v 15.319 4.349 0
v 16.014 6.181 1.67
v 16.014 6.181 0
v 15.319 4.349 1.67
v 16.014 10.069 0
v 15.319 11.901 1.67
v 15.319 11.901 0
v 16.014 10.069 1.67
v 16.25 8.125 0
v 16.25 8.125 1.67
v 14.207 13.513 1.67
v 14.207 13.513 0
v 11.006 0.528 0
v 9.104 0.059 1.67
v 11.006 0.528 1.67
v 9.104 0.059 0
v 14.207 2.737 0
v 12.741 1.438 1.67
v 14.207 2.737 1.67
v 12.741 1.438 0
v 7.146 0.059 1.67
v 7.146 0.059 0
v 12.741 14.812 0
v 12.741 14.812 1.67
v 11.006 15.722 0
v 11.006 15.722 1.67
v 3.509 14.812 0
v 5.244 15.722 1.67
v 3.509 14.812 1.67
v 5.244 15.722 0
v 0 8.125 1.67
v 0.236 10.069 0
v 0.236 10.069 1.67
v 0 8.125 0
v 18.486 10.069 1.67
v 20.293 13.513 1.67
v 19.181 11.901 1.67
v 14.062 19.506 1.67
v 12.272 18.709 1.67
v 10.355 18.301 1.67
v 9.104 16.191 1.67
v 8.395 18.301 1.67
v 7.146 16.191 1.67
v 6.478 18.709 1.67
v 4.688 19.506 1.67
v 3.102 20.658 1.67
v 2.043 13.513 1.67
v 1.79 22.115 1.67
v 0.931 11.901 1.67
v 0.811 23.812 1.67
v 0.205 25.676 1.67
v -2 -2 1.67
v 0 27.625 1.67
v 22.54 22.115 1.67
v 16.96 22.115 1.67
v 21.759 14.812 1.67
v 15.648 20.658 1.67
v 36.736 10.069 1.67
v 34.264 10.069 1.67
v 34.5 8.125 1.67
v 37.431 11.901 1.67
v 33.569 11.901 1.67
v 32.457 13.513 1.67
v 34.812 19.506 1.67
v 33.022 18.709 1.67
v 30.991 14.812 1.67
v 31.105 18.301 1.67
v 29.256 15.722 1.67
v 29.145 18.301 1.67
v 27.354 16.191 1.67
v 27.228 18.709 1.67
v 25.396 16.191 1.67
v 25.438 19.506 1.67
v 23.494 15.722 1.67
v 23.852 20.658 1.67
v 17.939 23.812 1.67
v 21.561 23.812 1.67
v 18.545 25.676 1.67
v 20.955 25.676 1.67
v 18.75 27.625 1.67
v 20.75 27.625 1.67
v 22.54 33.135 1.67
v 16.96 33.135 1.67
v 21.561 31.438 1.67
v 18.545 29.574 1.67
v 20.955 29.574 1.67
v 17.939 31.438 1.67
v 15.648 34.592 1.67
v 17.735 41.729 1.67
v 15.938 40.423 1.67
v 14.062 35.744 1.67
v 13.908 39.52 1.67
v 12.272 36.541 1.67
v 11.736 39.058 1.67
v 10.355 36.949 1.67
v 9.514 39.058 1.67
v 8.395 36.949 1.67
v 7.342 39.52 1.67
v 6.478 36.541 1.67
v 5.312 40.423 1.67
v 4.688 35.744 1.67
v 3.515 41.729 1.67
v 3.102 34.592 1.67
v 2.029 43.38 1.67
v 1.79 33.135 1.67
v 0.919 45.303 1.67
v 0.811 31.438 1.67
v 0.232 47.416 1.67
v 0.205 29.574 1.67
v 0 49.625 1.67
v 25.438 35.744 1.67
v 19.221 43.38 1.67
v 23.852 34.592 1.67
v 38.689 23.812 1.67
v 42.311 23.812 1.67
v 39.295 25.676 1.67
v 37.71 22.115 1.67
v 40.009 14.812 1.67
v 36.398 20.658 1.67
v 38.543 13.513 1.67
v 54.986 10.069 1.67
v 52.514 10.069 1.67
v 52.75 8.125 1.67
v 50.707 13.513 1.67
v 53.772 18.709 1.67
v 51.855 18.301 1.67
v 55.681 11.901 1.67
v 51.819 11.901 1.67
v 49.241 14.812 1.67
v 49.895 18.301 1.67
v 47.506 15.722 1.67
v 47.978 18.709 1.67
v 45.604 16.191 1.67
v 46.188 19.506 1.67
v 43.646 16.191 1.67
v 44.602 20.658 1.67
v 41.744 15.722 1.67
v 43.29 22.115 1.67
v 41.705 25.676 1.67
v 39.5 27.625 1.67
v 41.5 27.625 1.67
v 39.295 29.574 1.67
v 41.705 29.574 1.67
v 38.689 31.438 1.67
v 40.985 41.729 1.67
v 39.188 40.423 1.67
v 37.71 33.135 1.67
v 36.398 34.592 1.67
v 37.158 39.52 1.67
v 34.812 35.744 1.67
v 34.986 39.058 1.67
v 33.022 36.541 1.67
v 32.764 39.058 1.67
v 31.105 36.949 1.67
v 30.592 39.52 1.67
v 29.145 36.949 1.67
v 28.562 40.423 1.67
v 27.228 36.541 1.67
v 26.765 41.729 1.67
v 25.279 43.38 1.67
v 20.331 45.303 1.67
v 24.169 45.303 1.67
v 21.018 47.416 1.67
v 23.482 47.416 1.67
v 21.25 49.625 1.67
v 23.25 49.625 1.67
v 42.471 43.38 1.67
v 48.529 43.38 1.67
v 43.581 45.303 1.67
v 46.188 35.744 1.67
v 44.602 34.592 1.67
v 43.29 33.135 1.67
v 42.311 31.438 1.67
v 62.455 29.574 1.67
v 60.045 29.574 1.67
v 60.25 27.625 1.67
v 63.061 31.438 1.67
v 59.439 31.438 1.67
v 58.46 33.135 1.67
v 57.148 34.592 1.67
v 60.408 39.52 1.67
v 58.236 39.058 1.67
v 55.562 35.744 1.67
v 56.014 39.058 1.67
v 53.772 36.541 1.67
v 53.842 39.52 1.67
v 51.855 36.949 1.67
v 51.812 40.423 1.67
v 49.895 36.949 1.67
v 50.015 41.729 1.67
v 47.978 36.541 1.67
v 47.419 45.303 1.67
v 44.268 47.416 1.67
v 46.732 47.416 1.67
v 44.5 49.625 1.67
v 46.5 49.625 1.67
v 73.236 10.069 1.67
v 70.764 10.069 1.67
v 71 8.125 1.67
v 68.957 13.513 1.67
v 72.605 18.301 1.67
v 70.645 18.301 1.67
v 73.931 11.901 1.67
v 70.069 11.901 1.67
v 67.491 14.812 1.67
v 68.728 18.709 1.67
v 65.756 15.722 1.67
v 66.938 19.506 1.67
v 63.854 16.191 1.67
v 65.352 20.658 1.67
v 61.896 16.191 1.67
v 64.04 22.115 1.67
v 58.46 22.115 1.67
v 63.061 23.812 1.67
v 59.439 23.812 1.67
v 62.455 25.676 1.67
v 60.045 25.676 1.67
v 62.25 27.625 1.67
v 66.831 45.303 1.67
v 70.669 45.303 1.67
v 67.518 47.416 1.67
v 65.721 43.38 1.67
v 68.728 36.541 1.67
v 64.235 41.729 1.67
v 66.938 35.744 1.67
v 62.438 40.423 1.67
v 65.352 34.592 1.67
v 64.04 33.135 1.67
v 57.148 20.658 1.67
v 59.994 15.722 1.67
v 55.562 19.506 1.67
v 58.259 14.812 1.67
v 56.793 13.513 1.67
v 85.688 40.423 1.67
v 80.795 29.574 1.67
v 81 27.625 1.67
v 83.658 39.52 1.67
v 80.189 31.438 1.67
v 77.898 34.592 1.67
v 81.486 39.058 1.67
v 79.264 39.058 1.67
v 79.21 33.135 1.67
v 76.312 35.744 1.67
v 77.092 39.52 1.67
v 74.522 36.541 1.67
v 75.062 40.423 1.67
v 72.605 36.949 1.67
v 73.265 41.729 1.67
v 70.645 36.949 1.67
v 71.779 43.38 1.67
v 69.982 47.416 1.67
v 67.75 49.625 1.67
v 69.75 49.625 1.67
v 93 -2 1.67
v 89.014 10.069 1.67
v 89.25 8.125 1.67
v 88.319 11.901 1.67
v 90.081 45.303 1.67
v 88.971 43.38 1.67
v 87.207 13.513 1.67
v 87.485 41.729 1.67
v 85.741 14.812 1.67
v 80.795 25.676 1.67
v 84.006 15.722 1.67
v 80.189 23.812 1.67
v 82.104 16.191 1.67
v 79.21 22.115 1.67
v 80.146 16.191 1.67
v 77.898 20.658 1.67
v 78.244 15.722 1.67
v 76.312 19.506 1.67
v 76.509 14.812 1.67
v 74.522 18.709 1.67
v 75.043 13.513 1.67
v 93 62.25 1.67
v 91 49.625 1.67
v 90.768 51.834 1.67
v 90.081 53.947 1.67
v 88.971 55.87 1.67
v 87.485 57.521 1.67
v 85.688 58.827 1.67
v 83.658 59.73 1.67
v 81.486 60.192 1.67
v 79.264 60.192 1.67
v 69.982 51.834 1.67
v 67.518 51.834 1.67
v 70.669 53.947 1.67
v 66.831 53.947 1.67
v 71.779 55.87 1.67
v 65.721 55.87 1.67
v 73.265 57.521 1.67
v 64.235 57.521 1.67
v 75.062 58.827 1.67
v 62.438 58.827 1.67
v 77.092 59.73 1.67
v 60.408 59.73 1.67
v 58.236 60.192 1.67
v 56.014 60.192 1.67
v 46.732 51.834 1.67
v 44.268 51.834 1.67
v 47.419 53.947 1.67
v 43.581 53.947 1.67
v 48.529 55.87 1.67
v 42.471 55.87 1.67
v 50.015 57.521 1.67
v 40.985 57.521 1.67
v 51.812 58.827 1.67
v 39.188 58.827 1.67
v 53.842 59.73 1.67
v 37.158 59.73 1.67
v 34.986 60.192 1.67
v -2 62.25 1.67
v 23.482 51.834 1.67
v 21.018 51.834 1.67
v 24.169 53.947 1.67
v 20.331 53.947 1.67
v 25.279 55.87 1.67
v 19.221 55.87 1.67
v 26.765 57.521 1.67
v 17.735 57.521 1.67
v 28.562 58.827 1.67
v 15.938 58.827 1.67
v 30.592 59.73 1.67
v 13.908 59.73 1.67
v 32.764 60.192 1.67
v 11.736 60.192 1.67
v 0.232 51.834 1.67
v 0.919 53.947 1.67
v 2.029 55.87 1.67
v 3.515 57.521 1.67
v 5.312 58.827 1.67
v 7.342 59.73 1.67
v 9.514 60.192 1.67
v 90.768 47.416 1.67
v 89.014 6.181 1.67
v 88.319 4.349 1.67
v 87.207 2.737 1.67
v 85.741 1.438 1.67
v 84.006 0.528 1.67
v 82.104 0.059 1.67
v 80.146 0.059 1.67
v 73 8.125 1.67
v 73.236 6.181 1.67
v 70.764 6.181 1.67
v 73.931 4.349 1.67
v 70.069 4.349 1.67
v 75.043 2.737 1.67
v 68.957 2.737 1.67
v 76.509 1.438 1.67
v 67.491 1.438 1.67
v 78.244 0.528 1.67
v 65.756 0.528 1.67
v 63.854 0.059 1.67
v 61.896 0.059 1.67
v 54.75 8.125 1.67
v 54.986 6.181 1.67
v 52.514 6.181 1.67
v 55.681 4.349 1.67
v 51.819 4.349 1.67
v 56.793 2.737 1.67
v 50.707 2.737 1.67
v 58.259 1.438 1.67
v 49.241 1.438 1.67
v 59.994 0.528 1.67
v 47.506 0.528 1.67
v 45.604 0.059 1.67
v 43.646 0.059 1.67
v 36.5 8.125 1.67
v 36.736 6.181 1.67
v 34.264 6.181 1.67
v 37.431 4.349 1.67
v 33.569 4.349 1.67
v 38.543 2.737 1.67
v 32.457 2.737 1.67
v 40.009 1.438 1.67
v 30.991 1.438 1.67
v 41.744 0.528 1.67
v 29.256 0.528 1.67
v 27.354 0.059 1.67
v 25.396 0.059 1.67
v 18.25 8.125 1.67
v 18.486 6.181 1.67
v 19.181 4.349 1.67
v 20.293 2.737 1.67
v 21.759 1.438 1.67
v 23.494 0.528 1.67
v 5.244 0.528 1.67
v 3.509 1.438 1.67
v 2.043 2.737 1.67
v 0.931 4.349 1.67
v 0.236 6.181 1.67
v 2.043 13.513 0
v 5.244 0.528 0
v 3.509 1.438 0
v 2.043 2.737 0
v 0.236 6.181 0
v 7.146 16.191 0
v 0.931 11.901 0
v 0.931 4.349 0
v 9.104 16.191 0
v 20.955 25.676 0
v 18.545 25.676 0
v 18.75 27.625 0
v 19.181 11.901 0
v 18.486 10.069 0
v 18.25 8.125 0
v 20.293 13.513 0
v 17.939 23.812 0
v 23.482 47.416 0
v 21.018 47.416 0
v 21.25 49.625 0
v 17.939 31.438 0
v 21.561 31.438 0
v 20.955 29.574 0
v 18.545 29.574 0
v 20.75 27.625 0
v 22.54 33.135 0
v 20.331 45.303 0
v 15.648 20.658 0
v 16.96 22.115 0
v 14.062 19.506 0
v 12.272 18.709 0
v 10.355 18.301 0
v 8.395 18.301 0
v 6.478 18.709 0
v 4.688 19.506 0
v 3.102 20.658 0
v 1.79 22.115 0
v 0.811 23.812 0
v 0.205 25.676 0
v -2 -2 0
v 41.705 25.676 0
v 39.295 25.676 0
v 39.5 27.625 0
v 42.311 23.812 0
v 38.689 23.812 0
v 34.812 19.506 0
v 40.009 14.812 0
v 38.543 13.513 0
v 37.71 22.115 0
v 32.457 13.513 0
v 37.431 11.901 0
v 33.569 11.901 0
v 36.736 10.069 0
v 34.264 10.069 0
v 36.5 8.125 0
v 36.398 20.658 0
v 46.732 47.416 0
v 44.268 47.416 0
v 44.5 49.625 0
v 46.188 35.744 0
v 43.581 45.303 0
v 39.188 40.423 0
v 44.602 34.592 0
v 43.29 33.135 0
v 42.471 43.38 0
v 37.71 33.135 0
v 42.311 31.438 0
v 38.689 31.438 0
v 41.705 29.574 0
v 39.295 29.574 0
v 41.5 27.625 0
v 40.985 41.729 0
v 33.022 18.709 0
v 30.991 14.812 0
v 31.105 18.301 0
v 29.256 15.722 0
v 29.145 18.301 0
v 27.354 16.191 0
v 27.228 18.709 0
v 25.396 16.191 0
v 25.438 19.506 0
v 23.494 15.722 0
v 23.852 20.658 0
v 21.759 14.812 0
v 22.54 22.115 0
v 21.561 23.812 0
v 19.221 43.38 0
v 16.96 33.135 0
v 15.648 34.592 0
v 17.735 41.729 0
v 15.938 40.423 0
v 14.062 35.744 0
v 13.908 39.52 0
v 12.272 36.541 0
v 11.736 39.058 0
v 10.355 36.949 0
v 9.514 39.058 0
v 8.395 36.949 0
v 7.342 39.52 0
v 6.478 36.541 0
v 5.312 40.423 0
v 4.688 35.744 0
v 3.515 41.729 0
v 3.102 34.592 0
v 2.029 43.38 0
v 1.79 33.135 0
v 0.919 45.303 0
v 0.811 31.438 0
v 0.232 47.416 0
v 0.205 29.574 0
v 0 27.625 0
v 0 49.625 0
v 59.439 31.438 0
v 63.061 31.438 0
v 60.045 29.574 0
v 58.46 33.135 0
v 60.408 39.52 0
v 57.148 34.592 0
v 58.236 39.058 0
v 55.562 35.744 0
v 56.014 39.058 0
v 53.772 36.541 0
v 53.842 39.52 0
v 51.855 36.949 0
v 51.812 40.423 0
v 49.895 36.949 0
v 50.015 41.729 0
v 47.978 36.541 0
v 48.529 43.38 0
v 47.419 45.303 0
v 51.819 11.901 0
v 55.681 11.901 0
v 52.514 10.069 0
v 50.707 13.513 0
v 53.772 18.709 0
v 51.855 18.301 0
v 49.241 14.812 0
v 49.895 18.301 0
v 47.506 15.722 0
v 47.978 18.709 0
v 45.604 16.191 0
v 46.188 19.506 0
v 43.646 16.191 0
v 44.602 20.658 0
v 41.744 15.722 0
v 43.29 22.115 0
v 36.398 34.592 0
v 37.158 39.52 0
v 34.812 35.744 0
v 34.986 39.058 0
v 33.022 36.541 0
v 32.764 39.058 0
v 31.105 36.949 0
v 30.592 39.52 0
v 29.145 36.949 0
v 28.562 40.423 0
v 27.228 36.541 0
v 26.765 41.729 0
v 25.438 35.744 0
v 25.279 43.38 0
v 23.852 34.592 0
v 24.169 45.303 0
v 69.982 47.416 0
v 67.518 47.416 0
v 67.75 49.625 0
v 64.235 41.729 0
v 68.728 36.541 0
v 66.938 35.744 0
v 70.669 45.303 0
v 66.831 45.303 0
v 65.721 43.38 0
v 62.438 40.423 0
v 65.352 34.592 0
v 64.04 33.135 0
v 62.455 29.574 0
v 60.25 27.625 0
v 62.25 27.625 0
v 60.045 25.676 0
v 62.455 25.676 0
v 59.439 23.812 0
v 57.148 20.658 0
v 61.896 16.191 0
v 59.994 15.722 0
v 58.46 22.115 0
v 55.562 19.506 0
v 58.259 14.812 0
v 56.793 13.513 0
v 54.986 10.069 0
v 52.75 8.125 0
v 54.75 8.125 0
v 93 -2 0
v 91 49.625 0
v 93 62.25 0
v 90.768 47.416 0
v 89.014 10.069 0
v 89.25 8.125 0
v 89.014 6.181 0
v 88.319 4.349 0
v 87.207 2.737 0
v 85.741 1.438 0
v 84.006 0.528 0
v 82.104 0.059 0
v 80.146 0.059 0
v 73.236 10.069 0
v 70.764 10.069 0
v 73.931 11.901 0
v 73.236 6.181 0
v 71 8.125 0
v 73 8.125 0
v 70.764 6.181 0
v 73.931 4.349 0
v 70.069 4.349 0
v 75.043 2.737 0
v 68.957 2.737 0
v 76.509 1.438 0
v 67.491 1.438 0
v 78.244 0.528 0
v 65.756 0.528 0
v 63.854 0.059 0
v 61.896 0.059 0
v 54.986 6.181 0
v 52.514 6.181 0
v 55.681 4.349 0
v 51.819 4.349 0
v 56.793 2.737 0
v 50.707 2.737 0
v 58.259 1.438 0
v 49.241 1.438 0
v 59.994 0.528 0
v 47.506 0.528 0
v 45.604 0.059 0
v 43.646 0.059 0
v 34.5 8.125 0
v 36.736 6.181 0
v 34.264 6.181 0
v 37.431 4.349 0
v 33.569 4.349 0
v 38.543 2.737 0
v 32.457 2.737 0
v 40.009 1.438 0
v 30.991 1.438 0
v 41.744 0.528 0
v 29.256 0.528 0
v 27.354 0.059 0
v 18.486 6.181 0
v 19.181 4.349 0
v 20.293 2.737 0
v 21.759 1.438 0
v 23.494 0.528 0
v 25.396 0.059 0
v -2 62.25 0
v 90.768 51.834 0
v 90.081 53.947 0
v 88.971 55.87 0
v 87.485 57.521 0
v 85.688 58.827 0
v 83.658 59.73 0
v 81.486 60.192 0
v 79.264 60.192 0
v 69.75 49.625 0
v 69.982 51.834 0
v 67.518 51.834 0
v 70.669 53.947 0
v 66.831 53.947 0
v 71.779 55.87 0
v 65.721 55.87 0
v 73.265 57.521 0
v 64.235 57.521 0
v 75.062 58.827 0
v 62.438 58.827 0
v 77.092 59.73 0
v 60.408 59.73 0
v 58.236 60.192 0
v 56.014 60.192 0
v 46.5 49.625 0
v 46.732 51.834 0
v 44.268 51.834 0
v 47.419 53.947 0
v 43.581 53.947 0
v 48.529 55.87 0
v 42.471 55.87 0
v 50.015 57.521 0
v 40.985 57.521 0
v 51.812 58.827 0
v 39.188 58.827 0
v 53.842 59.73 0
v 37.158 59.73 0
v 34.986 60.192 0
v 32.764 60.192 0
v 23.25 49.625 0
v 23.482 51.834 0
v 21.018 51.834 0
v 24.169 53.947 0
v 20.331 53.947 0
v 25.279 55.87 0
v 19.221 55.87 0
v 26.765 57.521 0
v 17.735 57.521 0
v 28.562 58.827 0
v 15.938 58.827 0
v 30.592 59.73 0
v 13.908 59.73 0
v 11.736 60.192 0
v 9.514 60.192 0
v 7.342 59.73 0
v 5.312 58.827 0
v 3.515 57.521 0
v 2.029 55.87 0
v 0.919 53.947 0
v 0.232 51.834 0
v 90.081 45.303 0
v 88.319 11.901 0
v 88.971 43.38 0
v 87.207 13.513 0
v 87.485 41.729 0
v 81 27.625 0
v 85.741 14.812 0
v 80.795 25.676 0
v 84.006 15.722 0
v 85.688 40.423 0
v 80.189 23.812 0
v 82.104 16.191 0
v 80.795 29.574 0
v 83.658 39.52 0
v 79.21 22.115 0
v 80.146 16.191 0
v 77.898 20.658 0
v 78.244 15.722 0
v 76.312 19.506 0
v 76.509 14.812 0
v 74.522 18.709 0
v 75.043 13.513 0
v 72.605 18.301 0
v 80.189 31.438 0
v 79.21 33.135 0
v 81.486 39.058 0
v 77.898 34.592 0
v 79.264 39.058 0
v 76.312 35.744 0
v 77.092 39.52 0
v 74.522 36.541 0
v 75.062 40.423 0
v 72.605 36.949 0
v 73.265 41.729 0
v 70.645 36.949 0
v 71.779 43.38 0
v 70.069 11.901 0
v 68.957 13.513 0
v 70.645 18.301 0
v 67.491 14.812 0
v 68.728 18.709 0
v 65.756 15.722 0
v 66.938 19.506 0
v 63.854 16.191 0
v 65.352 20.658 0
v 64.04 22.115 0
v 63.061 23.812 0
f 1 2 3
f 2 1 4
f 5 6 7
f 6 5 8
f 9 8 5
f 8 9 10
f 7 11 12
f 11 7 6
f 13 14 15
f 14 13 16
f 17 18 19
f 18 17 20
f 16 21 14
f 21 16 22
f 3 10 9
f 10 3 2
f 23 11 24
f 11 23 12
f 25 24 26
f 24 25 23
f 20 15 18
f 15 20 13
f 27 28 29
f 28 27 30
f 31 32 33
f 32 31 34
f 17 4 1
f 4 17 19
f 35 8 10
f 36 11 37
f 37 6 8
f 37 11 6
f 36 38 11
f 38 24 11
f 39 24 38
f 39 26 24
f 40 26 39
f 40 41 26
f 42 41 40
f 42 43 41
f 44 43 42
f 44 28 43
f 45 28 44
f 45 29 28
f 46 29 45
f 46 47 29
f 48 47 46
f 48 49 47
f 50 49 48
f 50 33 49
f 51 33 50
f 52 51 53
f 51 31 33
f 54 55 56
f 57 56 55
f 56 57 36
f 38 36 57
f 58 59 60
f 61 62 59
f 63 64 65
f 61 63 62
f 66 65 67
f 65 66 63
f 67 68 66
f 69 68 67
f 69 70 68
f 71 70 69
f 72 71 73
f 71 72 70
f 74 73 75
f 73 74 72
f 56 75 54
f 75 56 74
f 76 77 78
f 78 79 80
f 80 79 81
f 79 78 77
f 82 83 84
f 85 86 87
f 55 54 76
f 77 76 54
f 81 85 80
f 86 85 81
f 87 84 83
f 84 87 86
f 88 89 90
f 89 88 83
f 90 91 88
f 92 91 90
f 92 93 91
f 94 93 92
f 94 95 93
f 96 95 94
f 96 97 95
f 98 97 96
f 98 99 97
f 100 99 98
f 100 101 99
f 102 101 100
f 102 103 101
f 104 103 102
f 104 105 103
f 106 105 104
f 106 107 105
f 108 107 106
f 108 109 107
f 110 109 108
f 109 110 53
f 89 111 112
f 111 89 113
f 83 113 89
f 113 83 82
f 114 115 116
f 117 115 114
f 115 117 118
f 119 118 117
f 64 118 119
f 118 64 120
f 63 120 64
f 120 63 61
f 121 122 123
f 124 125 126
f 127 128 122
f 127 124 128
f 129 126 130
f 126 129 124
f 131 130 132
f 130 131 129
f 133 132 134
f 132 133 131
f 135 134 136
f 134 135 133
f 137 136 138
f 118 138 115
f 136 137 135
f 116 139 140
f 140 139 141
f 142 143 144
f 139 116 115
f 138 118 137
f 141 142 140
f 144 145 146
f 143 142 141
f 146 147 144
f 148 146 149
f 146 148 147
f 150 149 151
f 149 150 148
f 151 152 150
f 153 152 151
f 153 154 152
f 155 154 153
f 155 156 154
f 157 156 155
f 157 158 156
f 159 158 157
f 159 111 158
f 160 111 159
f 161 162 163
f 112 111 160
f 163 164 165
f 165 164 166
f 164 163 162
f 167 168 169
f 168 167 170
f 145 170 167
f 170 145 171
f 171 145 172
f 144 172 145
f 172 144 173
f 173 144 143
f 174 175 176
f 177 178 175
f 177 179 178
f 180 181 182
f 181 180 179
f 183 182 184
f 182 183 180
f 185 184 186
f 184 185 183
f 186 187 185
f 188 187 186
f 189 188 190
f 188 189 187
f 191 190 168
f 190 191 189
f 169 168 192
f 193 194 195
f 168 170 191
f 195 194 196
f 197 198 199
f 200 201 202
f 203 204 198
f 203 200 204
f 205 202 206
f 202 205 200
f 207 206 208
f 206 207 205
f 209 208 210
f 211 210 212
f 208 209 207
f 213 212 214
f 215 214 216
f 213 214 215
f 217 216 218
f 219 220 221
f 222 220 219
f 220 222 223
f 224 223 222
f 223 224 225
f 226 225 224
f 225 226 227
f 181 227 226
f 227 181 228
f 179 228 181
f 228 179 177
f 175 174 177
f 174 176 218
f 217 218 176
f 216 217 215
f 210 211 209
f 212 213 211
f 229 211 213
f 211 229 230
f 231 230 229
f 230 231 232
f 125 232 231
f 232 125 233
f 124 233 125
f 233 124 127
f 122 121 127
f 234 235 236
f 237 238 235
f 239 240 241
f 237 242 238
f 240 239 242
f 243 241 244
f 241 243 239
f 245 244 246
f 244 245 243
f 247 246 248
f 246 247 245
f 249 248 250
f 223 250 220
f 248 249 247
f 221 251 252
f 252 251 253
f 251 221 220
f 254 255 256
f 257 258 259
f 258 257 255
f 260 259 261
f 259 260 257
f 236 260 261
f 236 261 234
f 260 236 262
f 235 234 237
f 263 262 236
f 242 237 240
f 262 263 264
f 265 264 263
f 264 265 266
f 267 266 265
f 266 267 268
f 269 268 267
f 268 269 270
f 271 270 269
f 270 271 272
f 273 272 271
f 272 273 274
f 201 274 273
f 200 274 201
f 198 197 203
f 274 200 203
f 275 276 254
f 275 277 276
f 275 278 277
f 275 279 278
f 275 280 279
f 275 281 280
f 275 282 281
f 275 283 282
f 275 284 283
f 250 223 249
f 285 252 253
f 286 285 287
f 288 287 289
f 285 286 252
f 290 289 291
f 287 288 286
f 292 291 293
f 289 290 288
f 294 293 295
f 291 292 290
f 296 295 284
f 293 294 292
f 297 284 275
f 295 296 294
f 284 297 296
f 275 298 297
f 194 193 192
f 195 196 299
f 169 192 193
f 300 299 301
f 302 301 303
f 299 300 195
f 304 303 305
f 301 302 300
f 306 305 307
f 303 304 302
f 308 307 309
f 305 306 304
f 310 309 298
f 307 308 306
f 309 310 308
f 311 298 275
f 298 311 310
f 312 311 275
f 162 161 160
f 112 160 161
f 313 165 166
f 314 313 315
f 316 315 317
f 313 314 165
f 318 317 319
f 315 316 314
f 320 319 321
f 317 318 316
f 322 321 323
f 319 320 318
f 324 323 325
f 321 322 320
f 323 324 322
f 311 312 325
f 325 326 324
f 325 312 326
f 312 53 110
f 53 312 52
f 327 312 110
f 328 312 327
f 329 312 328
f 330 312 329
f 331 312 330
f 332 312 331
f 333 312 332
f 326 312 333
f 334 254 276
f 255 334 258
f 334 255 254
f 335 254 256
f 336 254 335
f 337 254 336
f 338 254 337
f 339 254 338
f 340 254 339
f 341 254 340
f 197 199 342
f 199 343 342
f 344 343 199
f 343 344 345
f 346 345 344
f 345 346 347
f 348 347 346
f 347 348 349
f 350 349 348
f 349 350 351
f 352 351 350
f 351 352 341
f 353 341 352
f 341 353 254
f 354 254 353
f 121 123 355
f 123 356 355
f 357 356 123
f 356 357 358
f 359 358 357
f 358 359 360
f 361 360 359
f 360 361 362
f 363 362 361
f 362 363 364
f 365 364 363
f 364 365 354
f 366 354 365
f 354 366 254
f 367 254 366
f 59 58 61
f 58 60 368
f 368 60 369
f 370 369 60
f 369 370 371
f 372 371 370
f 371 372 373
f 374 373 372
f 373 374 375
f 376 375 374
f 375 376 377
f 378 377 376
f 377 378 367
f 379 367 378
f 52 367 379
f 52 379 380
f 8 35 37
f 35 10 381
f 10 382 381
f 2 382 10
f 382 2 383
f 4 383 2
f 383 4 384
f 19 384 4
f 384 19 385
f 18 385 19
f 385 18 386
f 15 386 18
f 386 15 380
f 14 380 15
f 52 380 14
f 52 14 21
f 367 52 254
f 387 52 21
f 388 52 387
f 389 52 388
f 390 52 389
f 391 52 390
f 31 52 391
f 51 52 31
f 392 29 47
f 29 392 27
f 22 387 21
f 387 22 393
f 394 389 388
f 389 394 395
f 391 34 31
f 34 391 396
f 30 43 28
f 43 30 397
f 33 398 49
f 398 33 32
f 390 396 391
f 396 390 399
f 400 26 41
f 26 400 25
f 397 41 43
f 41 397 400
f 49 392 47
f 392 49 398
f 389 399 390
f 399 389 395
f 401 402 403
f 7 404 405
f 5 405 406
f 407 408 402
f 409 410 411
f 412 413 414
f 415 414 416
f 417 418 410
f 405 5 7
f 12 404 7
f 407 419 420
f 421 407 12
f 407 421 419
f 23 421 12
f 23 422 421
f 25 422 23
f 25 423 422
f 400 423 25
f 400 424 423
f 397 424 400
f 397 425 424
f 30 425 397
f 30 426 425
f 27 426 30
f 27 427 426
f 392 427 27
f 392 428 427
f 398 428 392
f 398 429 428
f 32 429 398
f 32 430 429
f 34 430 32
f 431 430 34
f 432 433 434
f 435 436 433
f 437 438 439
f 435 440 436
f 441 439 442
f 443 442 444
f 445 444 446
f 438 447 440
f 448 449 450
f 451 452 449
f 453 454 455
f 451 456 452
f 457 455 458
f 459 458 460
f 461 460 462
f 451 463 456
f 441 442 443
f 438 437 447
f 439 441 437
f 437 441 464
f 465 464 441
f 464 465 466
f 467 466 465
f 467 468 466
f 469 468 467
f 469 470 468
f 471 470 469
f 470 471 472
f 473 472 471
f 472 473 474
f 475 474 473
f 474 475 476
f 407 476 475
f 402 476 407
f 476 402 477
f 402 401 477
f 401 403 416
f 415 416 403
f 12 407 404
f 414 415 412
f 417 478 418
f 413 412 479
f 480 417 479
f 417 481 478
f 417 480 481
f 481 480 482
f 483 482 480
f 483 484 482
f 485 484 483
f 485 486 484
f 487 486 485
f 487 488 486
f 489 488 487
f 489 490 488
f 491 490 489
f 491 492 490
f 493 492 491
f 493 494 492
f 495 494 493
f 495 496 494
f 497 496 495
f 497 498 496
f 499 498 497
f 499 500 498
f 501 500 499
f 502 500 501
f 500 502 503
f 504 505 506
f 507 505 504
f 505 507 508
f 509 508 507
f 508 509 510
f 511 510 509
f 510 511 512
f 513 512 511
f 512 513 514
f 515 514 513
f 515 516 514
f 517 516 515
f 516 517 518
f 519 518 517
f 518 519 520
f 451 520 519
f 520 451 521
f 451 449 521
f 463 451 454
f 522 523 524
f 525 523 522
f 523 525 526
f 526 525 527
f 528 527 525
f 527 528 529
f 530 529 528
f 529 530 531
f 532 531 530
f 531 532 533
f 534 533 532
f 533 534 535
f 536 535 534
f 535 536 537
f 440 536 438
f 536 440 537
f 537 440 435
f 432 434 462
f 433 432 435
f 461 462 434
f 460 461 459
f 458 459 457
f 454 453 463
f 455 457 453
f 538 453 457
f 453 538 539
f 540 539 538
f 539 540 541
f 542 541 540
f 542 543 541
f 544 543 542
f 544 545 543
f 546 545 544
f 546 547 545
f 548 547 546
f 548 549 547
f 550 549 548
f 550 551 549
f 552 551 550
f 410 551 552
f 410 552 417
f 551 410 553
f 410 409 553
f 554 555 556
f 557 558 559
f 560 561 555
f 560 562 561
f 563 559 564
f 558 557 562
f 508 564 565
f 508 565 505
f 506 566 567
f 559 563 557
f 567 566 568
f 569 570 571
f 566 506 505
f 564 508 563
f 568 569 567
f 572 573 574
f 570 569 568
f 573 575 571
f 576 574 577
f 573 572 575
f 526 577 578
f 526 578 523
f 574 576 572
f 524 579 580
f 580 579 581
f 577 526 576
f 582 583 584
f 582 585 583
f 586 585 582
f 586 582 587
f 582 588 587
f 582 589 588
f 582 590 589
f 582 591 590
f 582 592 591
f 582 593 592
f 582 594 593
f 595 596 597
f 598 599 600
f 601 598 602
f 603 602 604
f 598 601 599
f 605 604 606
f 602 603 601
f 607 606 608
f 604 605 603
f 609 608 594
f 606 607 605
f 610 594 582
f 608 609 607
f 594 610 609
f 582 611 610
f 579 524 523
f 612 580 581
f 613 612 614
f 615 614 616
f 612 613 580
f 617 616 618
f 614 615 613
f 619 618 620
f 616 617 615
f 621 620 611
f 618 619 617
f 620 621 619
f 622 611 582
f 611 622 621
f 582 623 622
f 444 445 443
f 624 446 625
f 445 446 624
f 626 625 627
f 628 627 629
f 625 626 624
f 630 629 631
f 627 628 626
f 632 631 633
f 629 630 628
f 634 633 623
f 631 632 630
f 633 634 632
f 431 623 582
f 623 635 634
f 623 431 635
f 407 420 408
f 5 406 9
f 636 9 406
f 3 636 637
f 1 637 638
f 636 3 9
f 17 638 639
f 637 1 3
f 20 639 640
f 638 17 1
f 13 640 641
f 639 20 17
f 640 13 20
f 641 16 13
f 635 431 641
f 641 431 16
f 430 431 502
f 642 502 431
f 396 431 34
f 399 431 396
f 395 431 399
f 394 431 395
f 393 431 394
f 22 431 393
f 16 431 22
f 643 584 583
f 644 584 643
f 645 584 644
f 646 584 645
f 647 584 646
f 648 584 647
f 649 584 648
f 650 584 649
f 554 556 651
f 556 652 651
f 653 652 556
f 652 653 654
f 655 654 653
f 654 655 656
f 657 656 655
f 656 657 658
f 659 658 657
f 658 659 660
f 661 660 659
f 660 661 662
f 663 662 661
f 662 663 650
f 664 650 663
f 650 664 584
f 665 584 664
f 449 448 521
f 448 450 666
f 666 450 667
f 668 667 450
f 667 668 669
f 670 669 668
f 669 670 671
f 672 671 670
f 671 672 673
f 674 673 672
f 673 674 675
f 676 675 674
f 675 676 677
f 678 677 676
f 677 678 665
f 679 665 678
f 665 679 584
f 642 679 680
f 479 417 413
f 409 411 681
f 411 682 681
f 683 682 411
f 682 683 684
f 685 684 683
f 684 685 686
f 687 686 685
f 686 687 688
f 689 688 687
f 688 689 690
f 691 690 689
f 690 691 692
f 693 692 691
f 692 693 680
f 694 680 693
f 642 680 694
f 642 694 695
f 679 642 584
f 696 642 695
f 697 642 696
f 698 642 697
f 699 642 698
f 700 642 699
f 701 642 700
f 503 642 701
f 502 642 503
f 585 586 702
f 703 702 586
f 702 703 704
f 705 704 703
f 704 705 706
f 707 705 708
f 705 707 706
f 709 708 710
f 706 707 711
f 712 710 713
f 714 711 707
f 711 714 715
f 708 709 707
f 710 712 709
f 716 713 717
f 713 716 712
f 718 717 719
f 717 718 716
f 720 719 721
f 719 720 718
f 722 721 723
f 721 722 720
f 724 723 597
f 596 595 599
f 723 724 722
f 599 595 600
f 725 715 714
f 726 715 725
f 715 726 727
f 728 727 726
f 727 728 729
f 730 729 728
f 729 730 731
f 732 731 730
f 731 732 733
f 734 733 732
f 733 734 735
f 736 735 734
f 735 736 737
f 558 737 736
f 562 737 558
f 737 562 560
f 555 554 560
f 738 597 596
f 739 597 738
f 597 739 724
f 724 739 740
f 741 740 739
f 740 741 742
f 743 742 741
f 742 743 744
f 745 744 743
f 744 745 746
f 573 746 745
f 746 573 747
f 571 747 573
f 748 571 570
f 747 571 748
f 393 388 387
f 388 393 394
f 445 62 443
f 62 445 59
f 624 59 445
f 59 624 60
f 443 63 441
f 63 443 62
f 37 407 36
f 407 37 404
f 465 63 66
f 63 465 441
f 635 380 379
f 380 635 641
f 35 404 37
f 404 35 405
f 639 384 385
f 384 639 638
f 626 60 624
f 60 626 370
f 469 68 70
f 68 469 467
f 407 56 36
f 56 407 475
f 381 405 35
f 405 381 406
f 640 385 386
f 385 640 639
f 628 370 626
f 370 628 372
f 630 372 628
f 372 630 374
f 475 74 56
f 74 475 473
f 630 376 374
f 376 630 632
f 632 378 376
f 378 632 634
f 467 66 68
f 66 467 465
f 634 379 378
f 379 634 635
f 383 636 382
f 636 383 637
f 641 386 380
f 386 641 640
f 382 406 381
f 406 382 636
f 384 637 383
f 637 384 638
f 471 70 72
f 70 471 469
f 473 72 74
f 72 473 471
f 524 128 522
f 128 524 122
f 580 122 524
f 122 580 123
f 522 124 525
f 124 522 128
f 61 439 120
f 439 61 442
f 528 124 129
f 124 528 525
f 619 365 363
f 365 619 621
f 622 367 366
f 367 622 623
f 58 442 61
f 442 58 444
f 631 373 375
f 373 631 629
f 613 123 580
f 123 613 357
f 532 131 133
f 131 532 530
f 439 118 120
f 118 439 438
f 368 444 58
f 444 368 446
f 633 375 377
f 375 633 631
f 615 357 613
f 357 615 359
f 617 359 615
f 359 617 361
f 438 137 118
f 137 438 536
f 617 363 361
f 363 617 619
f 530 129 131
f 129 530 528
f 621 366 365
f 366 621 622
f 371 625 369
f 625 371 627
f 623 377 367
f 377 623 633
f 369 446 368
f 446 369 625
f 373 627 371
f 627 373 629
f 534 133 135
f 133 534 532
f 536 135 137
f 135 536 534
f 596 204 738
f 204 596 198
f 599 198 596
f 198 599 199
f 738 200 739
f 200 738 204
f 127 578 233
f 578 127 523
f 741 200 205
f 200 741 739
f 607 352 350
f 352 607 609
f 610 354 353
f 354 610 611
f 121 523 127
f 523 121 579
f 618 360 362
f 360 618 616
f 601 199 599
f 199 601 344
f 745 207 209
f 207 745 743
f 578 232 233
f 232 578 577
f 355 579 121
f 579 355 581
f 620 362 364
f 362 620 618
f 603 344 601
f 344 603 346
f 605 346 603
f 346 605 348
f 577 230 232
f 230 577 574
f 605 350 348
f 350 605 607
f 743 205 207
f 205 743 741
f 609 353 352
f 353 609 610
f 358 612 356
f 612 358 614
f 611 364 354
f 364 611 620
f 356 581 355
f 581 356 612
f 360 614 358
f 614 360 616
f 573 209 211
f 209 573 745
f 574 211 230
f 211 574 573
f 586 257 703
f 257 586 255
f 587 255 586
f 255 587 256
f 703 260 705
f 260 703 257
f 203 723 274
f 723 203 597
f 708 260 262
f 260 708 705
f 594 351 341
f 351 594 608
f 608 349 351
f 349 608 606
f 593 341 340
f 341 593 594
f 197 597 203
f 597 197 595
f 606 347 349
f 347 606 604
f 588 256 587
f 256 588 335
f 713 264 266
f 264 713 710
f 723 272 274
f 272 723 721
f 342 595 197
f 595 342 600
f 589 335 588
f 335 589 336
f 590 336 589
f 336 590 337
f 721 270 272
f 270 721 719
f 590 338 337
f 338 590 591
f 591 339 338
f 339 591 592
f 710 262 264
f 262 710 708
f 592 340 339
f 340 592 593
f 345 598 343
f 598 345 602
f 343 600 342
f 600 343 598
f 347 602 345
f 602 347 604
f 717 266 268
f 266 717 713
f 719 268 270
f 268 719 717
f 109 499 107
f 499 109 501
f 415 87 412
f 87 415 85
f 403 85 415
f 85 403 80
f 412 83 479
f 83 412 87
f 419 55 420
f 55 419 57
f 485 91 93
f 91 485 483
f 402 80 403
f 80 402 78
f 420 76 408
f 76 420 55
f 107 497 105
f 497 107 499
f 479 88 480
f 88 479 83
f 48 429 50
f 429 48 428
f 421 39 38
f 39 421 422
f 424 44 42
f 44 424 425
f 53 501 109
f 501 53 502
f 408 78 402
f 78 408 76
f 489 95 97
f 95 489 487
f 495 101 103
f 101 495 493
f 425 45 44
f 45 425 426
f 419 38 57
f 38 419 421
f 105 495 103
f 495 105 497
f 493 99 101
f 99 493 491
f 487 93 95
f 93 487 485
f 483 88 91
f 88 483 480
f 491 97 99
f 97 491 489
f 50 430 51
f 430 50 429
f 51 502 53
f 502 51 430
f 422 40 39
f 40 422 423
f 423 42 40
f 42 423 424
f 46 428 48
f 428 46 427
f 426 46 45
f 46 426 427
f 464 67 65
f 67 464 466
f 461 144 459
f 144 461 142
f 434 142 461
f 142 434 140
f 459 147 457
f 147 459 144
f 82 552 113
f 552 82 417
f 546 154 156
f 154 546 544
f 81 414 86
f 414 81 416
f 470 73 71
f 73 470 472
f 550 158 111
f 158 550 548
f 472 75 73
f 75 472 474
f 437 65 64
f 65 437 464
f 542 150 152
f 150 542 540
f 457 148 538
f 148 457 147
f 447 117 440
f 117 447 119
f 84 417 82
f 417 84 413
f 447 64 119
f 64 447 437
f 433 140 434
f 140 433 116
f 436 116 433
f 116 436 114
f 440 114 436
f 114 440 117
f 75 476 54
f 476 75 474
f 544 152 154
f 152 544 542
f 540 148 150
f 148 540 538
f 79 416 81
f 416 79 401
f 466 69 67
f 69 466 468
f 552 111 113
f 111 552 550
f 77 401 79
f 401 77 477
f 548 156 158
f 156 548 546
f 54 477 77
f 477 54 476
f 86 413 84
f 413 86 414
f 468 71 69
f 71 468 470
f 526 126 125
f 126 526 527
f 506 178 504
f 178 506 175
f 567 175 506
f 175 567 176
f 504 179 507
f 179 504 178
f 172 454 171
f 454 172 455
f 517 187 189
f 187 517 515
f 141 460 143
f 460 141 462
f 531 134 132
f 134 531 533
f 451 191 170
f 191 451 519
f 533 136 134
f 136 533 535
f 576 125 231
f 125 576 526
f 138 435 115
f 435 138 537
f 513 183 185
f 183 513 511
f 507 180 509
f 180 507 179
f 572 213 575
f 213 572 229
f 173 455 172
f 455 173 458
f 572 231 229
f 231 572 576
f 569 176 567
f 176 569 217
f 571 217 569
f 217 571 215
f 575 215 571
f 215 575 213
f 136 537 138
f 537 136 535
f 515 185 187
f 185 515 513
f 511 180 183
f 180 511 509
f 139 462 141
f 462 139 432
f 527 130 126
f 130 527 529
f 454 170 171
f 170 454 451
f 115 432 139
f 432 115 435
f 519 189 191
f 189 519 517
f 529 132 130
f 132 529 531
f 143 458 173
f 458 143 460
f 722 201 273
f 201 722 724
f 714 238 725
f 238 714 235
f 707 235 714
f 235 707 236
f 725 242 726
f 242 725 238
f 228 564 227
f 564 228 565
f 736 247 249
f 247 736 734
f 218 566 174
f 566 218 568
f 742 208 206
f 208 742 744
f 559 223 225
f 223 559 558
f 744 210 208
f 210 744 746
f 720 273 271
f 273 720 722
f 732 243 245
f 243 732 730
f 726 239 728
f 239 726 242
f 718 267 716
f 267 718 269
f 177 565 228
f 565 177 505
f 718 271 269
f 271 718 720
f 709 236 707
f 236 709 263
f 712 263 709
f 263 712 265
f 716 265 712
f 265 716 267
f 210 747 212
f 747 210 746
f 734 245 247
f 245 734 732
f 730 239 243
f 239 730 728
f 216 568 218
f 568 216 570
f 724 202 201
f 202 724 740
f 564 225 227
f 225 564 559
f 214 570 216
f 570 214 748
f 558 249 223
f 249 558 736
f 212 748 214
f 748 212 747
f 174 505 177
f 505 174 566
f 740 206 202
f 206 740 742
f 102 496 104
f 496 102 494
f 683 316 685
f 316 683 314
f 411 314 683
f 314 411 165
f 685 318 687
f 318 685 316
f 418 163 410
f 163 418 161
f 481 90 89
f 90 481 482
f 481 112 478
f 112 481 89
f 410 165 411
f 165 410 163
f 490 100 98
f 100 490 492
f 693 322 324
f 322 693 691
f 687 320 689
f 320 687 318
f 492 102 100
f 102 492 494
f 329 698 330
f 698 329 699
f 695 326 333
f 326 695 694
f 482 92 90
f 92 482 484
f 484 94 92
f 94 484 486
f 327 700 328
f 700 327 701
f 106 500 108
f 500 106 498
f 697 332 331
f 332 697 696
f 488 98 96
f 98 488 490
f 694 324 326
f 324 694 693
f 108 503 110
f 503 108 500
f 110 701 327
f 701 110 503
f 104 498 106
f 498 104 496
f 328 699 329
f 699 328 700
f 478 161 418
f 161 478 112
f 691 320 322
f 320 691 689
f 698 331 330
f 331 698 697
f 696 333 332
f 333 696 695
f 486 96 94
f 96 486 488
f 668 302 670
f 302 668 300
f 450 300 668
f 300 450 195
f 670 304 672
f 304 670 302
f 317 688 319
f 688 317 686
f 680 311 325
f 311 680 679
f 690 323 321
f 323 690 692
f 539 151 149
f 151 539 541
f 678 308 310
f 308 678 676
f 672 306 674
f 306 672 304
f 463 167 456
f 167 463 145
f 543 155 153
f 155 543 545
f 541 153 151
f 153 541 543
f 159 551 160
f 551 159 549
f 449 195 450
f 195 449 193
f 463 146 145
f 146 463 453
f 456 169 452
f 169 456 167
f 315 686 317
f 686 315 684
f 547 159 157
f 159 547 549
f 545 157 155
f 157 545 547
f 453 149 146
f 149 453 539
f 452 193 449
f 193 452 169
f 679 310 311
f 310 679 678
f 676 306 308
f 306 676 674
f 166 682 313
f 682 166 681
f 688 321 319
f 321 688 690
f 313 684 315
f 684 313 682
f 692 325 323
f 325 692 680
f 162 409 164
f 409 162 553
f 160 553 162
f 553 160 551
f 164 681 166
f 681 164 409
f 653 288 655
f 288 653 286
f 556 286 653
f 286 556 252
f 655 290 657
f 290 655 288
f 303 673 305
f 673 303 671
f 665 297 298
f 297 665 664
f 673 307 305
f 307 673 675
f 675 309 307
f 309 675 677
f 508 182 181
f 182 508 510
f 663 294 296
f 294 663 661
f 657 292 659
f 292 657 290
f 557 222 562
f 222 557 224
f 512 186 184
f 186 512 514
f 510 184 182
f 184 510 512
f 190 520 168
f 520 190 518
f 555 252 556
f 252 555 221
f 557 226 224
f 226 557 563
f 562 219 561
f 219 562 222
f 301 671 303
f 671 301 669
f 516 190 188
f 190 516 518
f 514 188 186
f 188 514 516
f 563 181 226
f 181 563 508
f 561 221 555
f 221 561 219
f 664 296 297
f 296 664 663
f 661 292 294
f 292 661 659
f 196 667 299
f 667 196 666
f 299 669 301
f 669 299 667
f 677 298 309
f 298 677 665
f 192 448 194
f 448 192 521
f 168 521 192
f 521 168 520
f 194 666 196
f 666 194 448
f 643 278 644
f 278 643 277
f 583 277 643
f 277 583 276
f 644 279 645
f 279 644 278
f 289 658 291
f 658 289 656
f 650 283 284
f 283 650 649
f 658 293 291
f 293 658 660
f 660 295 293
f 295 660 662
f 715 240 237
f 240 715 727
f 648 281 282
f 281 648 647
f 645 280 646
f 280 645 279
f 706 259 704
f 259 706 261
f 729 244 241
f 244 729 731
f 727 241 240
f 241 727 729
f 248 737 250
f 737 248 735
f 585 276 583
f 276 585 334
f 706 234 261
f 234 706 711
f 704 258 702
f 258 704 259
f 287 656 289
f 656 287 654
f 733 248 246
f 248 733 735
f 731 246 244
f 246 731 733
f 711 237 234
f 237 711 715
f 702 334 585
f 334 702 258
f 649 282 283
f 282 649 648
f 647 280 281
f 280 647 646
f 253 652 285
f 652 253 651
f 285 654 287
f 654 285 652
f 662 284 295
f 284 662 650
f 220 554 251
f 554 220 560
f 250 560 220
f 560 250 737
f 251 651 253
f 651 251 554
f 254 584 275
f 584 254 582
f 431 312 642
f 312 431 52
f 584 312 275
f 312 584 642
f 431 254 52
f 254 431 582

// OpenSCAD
oneCent = 16.25;
oneCentCount = 5;

twoCent = 18.75;
twoCentCount = 4;

fiveCent = 21.25;
fiveCentCount = 4;

borderThickness = 2;

maxLength = max(fiveCent*fiveCentCount+(fiveCentCount+1)*borderThickness, twoCent*twoCentCount+(twoCentCount+1)*borderThickness,oneCent*oneCentCount+(oneCentCount+1)*borderThickness);

difference () {
translate([-borderThickness,-borderThickness,0])
cube(size = [maxLength,oneCent+twoCent+fiveCent+4*borderThickness,1.67]);

translate([oneCent/2,oneCent/2,0])
	coin(oneCent,oneCentCount);

translate([twoCent/2,oneCent+twoCent/2+borderThickness,0]) 
	coin(twoCent,twoCentCount);

translate([fiveCent/2,oneCent+twoCent+fiveCent/2+2*borderThickness,0]) 
	coin(fiveCent,fiveCentCount);
}

module coin(d,c) {
	for (i = [0:c-1]) {
		translate([(d+borderThickness)*i,0,0])
		cylinder(h = 1.67, r=d/2);
	}
}
